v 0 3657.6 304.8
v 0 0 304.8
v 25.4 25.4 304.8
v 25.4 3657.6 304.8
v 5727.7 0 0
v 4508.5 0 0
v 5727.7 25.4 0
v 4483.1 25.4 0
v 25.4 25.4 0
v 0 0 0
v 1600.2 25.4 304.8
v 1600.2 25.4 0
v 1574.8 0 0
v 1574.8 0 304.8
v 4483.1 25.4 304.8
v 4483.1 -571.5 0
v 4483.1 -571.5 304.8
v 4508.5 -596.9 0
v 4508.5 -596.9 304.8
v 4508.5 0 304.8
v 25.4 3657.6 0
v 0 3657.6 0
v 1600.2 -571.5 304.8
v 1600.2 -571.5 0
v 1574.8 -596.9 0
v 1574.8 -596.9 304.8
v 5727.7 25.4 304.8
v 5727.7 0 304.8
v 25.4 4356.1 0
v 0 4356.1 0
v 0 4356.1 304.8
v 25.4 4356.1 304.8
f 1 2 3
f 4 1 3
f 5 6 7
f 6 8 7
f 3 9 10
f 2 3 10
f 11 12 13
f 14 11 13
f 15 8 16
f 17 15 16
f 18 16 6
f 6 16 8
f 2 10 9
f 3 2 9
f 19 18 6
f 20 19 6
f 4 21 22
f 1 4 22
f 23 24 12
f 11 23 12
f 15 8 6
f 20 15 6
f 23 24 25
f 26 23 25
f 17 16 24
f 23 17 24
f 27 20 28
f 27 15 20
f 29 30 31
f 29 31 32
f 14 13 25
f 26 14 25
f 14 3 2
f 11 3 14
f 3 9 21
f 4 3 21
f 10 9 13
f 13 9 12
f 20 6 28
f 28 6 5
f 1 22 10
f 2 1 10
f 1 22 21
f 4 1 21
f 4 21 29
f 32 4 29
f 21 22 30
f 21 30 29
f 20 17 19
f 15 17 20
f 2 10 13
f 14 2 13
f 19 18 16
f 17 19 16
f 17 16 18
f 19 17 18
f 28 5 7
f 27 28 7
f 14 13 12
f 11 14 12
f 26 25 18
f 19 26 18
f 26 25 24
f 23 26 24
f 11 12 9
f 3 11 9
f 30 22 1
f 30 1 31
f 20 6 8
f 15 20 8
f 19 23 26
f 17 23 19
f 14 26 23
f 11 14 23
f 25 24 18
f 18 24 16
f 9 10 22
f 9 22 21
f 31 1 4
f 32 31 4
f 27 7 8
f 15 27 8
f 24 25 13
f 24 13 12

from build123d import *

# Parameters (mm, degrees)
F1_DEPTH  = 304.8
F3_DEPTH  = 304.8
F5_DEPTH  = 304.8
F7_DEPTH  = 304.8
F9_DEPTH  = 304.8
F11_DEPTH = 304.8
F12_W     = 25.4
F12_H     = 698.5
F13_DEPTH = 304.8


with BuildPart() as f1:
    # F0 (on Top) → F1 (new body)
    with BuildSketch(Plane.XY):
        Polygon((0, 3657.6), (0, 0), (25.4, 25.4), (25.4, 3657.6), align=None)
    extrude(amount=F1_DEPTH)


with BuildPart() as f3:
    # F2 (on Top) → F3 (new body)
    with BuildSketch(Plane.XY):
        Polygon((25.4, 25.4), (0, 0), (1574.8, 0), (1600.2, 25.4), align=None)
    extrude(amount=F3_DEPTH)


with BuildPart() as f5:
    # F4 (on Top) → F5 (new body)
    with BuildSketch(Plane.XY):
        Polygon((1600.2, -571.5), (1600.2, 25.4), (1574.8, 0), (1574.8, -596.9), align=None)
    extrude(amount=F5_DEPTH)


with BuildPart() as f7:
    # F6 (on Top) → F7 (new body)
    with BuildSketch(Plane.XY):
        Polygon((1600.2, -571.5), (1574.8, -596.9), (4508.5, -596.9), (4483.1, -571.5), align=None)
    extrude(amount=F7_DEPTH)


with BuildPart() as f9:
    # F8 (on Top) → F9 (new body)
    with BuildSketch(Plane.XY):
        Polygon((4483.1, -571.5), (4508.5, -596.9), (4508.5, 0), (4483.1, 25.4), align=None)
    extrude(amount=F9_DEPTH)


with BuildPart() as f11:
    # F10 (on Top) → F11 (new body)
    with BuildSketch(Plane.XY):
        Polygon((5727.7, 0), (5727.7, 25.4), (4483.1, 25.4), (4508.5, 0), align=None)
    extrude(amount=F11_DEPTH)


with BuildPart() as f13:
    # F12 (on Top) → F13 (new body)
    with BuildSketch(Plane.XY):
        with Locations((12.7, 4006.85)):
            Rectangle(F12_W, F12_H)
    extrude(amount=F13_DEPTH)


solid = Compound([f1.part, f3.part, f5.part, f7.part, f9.part, f11.part, f13.part])
